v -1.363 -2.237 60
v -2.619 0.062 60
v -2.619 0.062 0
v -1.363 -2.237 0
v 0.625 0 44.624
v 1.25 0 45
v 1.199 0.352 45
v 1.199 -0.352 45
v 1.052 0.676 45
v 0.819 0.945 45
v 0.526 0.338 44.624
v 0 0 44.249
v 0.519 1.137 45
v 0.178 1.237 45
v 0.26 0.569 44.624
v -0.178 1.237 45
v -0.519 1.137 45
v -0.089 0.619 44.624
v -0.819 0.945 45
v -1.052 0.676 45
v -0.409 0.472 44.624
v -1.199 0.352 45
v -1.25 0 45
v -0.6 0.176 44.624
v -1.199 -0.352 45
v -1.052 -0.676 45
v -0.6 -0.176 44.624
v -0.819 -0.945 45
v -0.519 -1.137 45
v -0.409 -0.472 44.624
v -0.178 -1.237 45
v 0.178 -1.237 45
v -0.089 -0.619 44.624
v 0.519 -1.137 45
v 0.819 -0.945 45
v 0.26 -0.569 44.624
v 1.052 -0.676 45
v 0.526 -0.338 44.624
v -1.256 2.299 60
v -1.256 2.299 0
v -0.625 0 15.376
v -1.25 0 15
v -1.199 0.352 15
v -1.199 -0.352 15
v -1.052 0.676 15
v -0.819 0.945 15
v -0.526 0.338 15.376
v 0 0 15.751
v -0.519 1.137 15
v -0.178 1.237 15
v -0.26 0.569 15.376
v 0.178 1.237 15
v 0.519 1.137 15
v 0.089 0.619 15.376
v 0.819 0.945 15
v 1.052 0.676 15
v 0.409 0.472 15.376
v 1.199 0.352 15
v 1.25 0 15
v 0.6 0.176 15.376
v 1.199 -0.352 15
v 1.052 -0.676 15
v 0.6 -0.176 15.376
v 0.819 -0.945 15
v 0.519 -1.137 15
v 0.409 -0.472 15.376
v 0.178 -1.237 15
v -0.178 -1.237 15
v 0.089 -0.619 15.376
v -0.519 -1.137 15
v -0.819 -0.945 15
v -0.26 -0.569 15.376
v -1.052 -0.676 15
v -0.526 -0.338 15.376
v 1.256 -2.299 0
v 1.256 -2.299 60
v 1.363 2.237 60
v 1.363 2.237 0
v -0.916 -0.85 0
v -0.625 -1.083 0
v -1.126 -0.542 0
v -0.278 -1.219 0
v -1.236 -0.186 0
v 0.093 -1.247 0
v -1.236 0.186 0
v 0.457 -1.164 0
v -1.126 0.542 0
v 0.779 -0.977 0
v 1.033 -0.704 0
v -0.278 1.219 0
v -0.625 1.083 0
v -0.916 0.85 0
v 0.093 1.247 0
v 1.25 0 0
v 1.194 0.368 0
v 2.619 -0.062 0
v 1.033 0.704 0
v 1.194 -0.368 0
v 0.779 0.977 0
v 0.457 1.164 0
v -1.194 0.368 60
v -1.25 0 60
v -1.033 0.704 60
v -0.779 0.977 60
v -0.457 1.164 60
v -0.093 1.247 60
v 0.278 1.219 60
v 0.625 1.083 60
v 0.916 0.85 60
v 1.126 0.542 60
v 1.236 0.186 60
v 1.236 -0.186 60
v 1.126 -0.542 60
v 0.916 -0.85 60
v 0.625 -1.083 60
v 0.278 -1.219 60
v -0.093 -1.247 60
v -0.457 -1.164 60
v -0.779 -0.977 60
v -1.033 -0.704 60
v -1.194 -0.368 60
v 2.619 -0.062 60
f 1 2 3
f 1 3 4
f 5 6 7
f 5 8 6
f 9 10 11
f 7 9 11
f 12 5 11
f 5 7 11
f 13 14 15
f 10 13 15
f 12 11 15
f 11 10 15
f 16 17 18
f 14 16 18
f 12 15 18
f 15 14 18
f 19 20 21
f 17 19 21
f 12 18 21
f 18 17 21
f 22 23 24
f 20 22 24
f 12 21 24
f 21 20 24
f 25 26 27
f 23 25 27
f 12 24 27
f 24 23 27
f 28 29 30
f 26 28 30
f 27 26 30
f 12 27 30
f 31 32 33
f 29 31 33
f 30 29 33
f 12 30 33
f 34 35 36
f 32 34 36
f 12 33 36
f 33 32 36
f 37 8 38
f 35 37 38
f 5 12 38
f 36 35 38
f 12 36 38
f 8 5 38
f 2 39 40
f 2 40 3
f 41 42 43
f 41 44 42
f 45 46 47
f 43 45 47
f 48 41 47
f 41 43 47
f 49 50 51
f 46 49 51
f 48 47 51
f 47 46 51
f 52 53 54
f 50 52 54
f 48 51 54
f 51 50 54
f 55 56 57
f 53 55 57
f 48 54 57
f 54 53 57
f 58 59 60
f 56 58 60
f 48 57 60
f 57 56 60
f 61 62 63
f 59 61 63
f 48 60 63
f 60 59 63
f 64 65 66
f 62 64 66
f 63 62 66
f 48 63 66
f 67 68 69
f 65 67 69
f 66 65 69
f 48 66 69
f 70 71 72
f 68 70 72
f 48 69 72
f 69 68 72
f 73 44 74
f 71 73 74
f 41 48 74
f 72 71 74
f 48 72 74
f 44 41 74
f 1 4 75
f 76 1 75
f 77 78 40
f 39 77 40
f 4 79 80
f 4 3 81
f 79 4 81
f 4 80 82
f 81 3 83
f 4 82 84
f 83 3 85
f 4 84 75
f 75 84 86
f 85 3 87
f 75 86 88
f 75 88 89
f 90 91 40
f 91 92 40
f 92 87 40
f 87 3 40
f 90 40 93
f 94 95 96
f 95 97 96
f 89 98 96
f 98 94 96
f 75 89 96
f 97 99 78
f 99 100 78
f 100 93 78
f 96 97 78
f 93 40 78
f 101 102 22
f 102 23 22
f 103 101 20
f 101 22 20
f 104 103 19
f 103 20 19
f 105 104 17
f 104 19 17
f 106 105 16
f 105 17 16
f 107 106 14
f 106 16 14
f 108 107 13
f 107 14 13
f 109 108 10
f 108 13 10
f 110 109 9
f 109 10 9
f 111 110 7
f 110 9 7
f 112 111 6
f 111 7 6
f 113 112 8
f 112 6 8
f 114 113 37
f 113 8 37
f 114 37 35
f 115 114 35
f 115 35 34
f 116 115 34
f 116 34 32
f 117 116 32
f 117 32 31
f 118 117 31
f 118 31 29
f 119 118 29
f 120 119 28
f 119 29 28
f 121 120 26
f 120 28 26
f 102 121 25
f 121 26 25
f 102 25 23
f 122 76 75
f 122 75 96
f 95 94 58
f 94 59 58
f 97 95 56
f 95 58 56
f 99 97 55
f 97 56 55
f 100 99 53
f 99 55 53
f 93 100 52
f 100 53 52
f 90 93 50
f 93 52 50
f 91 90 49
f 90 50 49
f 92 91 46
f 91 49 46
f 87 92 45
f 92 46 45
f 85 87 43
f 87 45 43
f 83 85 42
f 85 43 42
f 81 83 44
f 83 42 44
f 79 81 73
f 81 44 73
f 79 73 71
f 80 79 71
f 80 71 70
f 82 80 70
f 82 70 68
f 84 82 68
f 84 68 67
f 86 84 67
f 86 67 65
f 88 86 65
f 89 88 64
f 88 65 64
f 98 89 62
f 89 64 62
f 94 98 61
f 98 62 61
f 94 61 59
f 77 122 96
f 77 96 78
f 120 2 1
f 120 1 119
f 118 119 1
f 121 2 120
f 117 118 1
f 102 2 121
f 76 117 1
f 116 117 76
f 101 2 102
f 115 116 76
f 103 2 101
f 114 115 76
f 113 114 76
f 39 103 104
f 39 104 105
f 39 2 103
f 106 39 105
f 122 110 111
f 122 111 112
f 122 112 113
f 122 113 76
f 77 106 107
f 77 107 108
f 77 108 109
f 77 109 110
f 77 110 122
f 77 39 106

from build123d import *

# Parameters (mm, degrees)
EXTRUDE_1_DEPTH        = 60
HOLE_WIZARD_M3_1_D     = 2.5
HOLE_WIZARD_M3_1_DEPTH = 15
HOLE_WIZARD_M3_1_TIP   = 0.751075774
HOLE_WIZARD_M3_2_D     = 2.5
HOLE_WIZARD_M3_2_DEPTH = 15
HOLE_WIZARD_M3_2_TIP   = 0.751075774


with BuildPart() as part:
    # 草图1 → 凸台-拉伸1 (new body)
    with BuildSketch(Plane.XY):
        Polygon((1.363201019, 2.23742776), (-1.25606877, 2.299280593), (-2.619269789, 0.061852833), (-1.363201019, -2.23742776), (1.25606877, -2.299280593), (2.619269789, -0.061852833), align=None)
    extrude(amount=EXTRUDE_1_DEPTH)

    # M3 螺纹孔1
    with Locations(Plane.XY.offset(60)):
        with Locations((0, 0)):
            Hole(HOLE_WIZARD_M3_1_D / 2, depth=HOLE_WIZARD_M3_1_DEPTH)
            with Locations((0, 0, -(HOLE_WIZARD_M3_1_DEPTH + HOLE_WIZARD_M3_1_TIP / 2))):  # 118° drill point
                Cone(0, HOLE_WIZARD_M3_1_D / 2, HOLE_WIZARD_M3_1_TIP, mode=Mode.SUBTRACT)

    # M3 螺纹孔2
    with Locations(Plane(origin=(0, 0, 0), x_dir=(-1, 0, 0), z_dir=(0, 0, -1))):
        with Locations((0, 0)):
            Hole(HOLE_WIZARD_M3_2_D / 2, depth=HOLE_WIZARD_M3_2_DEPTH)
            with Locations((0, 0, -(HOLE_WIZARD_M3_2_DEPTH + HOLE_WIZARD_M3_2_TIP / 2))):  # 118° drill point
                Cone(0, HOLE_WIZARD_M3_2_D / 2, HOLE_WIZARD_M3_2_TIP, mode=Mode.SUBTRACT)


solid = part.part
